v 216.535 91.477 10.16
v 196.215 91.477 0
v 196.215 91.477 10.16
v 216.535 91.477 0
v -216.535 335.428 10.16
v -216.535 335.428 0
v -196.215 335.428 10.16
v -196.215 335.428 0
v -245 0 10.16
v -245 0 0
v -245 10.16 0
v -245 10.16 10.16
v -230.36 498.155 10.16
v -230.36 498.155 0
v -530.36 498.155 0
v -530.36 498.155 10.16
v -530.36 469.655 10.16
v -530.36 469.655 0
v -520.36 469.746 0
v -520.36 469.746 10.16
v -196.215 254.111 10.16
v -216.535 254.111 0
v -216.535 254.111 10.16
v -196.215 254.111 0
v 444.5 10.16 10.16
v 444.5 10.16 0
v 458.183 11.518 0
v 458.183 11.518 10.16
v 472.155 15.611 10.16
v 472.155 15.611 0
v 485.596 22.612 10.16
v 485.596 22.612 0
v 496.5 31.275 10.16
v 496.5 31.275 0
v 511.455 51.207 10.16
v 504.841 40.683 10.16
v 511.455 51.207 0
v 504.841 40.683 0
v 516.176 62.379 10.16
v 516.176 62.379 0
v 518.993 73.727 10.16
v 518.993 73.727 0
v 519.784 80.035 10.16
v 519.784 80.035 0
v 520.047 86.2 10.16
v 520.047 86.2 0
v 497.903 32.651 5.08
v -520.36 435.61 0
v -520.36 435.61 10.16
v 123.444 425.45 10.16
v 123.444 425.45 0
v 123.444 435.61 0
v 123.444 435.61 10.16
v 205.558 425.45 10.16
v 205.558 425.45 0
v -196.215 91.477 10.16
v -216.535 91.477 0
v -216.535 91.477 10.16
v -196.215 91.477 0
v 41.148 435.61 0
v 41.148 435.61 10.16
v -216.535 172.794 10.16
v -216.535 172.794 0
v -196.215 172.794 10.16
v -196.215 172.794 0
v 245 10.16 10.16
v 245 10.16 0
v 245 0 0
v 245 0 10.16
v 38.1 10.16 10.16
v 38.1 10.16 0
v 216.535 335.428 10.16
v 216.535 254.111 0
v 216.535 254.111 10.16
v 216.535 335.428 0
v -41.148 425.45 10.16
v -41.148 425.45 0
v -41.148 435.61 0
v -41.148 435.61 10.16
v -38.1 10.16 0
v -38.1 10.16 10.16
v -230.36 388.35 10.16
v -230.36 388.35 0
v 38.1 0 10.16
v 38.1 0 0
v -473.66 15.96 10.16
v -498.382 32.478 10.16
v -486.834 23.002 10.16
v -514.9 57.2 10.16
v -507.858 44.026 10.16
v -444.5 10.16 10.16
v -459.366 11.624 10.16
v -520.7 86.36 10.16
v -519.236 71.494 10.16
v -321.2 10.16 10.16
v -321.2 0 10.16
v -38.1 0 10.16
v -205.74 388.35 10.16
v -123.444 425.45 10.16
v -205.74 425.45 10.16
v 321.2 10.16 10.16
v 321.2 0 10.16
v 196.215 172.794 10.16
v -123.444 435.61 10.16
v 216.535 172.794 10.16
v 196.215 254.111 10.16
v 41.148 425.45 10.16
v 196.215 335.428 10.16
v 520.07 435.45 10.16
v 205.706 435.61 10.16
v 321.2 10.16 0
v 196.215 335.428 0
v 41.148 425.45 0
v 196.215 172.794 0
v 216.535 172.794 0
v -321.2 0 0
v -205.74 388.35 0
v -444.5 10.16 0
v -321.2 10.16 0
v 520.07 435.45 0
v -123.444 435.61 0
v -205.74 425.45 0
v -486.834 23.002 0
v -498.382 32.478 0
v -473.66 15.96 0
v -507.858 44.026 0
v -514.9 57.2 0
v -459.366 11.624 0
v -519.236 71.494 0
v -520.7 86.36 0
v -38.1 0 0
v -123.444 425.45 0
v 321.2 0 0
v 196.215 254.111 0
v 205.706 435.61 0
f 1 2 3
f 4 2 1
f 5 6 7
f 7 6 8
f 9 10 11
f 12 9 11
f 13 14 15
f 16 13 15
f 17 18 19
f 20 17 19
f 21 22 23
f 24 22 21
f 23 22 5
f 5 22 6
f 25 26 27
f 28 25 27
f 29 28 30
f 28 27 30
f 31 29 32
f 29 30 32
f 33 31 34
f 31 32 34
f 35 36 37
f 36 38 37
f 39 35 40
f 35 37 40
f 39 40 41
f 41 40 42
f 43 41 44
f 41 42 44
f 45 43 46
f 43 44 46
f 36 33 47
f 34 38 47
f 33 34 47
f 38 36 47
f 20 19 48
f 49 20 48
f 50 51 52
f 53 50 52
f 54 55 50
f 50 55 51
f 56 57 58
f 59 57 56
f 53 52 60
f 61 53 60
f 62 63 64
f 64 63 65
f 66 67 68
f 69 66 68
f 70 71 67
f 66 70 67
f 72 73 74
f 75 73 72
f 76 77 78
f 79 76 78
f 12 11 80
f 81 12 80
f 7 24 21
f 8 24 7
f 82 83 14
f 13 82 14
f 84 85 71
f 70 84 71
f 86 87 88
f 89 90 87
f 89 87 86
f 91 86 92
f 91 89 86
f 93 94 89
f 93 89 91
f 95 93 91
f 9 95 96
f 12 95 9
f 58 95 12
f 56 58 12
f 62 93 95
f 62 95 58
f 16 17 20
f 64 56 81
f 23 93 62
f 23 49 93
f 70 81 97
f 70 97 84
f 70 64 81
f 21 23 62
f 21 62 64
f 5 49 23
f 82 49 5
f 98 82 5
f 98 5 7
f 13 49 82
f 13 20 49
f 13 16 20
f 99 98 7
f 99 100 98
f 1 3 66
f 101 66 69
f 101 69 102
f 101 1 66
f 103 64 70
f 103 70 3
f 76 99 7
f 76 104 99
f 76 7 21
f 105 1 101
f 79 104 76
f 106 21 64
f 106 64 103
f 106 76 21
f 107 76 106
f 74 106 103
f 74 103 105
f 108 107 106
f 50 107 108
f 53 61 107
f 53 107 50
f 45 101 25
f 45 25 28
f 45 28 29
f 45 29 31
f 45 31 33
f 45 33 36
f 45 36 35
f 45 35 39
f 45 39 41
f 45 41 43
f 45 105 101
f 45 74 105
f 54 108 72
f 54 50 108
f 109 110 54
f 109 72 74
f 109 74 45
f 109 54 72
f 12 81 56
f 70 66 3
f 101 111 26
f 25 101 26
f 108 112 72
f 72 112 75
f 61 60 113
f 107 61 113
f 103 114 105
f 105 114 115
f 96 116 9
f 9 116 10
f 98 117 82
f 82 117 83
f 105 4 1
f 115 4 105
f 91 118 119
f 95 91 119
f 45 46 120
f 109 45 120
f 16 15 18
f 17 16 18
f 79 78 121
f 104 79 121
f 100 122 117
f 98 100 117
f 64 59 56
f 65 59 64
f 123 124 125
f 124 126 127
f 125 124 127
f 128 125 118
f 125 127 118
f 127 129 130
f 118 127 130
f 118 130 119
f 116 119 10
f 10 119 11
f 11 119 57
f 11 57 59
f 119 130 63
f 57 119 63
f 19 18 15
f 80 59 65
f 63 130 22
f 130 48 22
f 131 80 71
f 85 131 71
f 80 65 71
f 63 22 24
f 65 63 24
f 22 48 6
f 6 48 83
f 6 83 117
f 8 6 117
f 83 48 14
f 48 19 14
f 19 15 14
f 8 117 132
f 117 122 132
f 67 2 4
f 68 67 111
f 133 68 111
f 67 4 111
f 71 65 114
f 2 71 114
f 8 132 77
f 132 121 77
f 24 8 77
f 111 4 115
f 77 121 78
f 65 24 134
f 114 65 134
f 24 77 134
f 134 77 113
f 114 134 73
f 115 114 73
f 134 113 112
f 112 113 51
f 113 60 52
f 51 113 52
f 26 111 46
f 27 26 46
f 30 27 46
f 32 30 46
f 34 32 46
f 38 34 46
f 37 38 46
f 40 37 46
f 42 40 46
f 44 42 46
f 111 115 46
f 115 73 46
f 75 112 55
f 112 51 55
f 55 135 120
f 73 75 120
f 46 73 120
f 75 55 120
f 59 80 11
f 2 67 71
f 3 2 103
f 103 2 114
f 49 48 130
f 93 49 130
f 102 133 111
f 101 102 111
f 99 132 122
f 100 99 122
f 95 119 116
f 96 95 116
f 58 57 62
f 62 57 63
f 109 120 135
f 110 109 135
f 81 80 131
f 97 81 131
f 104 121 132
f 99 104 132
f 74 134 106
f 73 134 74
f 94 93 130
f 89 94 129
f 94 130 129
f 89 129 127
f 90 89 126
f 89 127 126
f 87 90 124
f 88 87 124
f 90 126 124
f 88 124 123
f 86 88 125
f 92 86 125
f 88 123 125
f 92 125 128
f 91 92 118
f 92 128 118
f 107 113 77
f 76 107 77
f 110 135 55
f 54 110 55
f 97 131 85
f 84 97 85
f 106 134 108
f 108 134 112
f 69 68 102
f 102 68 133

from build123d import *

# Parameters (mm, degrees)
SKETCH1_W           = 20.32
SKETCH1_H           = 81.316938585
BOSS_EXTRUDE1_DEPTH = 10.16


with BuildPart() as part:
    # Sketch1 → Boss-Extrude1 (new body)
    with BuildSketch(Plane.XY):
        with BuildLine():
            Line((-444.5, 10.16), (-321.2, 10.16))
            Line((-321.2, 10.16), (-321.2, 0))
            Line((-321.2, 0), (-245, 0))
            Line((-245, 0), (-245, 10.16))
            Line((-245, 10.16), (-38.1, 10.16))
            Line((-38.1, 10.16), (-38.1, 0))
            Line((-38.1, 0), (38.1, 0))
            Line((38.1, 0), (38.1, 10.16))
            Line((38.1, 10.16), (245, 10.16))
            Line((245, 10.16), (245, 0))
            Line((245, 0), (321.2, 0))
            Line((321.2, 0), (321.2, 10.16))
            Line((321.2, 10.16), (444.500003861, 10.16))
            add(Edge.make_bspline(
                [(444.500003861, 10.16), (519.890985801, 10.806562601), (520.046520423, 86.2)],
                knots=[4.720964914, 4.720964914, 4.720964914, 6.281122341, 6.281122341, 6.281122341], degree=2, weights=[1, 0.710858178, 1]))
            Line((520.046520423, 86.2), (520.070316185, 435.449980504))
            Line((520.070316185, 435.449980504), (205.706405146, 435.61))
            Line((205.706405146, 435.61), (205.558012439, 425.45))
            Line((205.558012439, 425.45), (123.444, 425.45))
            Line((123.444, 425.45), (123.444, 435.61))
            Line((123.444, 435.61), (41.148, 435.61))
            Line((41.148, 435.61), (41.148, 425.45))
            Line((41.148, 425.45), (-41.148, 425.45))
            Line((-41.148, 425.45), (-41.148, 435.61))
            Line((-41.148, 435.61), (-123.444, 435.61))
            Line((-123.444, 435.61), (-123.444, 425.45))
            Line((-123.444, 425.45), (-205.74, 425.45))
            Line((-205.74, 425.45), (-205.74, 388.35))
            Line((-205.74, 388.35), (-230.359692718, 388.35))
            Line((-230.359692718, 388.35), (-230.359692718, 498.154928973))
            Line((-230.359692718, 498.154928973), (-530.359692718, 498.154928973))
            Line((-530.359692718, 498.154928973), (-530.359692718, 469.654928973))
            Line((-530.359692718, 469.654928973), (-520.360110714, 469.746360594))
            Line((-520.360110714, 469.746360594), (-520.360110714, 435.61))
            Line((-520.360110714, 435.61), (-520.7, 86.36))
            ThreePointArc((-520.7, 86.36), (-498.381536726, 32.478463274), (-444.5, 10.16))
        make_face()
        with Locations((206.375268781, 132.135407878)):
            Rectangle(SKETCH1_W, SKETCH1_H, mode=Mode.SUBTRACT)
        with Locations((206.375268781, 294.769285048)):
            Rectangle(SKETCH1_W, SKETCH1_H, mode=Mode.SUBTRACT)
        with Locations((-206.375268781, 132.135407878)):
            Rectangle(SKETCH1_W, SKETCH1_H, mode=Mode.SUBTRACT)
        with Locations((-206.375268781, 294.769285048)):
            Rectangle(SKETCH1_W, SKETCH1_H, mode=Mode.SUBTRACT)
    extrude(amount=BOSS_EXTRUDE1_DEPTH)


solid = part.part
